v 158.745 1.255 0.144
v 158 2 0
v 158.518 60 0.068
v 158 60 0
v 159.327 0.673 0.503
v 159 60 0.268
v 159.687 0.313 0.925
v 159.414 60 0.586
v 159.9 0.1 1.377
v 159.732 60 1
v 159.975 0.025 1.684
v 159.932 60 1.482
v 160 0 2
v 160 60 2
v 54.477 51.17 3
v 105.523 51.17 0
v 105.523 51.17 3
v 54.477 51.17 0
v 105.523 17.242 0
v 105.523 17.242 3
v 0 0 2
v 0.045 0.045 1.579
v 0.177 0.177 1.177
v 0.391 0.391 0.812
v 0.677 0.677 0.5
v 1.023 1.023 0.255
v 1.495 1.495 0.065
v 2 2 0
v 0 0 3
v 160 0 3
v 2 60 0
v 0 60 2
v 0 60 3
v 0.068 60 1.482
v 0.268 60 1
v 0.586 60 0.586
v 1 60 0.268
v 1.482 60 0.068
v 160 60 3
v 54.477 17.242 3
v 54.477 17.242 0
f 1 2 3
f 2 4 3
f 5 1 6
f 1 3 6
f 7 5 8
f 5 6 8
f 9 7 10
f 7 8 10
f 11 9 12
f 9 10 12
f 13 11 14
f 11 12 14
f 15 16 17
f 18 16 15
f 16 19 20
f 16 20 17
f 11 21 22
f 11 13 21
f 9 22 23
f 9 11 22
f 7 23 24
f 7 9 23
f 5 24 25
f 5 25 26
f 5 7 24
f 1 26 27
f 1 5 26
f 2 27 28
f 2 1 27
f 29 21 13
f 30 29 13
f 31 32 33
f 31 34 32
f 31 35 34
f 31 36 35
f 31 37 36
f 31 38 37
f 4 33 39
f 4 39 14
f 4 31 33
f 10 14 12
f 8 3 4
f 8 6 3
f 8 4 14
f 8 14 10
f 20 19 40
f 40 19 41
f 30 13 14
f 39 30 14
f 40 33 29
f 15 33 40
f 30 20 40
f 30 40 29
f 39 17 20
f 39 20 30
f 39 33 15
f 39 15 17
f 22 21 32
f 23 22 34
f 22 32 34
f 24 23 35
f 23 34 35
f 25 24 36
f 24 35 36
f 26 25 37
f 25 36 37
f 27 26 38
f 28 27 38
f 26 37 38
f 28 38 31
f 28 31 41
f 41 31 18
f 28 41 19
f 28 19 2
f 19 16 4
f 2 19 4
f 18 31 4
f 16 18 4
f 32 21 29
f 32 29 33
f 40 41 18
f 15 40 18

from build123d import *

# Parameters (mm, degrees)
SKETCH1_W           = 160
SKETCH1_H           = 60
BOSS_EXTRUDE1_DEPTH = 3
SKETCH2_W           = 51.046896962
SKETCH2_H           = 33.928778657
CUT_EXTRUDE1_DEPTH  = 171.906407136
FILLET1_R           = 2


with BuildPart() as part:
    # Sketch1 → Boss-Extrude1 (new body)
    with BuildSketch(Plane.XY):
        with Locations((80, 30)):
            Rectangle(SKETCH1_W, SKETCH1_H)
    extrude(amount=BOSS_EXTRUDE1_DEPTH)

    # Sketch2 → Cut-Extrude1 (cut, through all)
    with BuildSketch(Plane(origin=(0, 0, 0), x_dir=(-1, 0, 0), z_dir=(0, 0, -1))):
        with Locations((-80, 34.206093002)):
            Rectangle(SKETCH2_W, SKETCH2_H)
    extrude(amount=-CUT_EXTRUDE1_DEPTH, mode=Mode.SUBTRACT)

    # Fillet1
    fillet1_edges = [part.edges().sort_by_distance(p)[0] for p in [
        (160, 30, 0),
        (80, 0, 0),
        (0, 30, 0),
    ]]
    fillet(fillet1_edges, radius=FILLET1_R)


solid = part.part
